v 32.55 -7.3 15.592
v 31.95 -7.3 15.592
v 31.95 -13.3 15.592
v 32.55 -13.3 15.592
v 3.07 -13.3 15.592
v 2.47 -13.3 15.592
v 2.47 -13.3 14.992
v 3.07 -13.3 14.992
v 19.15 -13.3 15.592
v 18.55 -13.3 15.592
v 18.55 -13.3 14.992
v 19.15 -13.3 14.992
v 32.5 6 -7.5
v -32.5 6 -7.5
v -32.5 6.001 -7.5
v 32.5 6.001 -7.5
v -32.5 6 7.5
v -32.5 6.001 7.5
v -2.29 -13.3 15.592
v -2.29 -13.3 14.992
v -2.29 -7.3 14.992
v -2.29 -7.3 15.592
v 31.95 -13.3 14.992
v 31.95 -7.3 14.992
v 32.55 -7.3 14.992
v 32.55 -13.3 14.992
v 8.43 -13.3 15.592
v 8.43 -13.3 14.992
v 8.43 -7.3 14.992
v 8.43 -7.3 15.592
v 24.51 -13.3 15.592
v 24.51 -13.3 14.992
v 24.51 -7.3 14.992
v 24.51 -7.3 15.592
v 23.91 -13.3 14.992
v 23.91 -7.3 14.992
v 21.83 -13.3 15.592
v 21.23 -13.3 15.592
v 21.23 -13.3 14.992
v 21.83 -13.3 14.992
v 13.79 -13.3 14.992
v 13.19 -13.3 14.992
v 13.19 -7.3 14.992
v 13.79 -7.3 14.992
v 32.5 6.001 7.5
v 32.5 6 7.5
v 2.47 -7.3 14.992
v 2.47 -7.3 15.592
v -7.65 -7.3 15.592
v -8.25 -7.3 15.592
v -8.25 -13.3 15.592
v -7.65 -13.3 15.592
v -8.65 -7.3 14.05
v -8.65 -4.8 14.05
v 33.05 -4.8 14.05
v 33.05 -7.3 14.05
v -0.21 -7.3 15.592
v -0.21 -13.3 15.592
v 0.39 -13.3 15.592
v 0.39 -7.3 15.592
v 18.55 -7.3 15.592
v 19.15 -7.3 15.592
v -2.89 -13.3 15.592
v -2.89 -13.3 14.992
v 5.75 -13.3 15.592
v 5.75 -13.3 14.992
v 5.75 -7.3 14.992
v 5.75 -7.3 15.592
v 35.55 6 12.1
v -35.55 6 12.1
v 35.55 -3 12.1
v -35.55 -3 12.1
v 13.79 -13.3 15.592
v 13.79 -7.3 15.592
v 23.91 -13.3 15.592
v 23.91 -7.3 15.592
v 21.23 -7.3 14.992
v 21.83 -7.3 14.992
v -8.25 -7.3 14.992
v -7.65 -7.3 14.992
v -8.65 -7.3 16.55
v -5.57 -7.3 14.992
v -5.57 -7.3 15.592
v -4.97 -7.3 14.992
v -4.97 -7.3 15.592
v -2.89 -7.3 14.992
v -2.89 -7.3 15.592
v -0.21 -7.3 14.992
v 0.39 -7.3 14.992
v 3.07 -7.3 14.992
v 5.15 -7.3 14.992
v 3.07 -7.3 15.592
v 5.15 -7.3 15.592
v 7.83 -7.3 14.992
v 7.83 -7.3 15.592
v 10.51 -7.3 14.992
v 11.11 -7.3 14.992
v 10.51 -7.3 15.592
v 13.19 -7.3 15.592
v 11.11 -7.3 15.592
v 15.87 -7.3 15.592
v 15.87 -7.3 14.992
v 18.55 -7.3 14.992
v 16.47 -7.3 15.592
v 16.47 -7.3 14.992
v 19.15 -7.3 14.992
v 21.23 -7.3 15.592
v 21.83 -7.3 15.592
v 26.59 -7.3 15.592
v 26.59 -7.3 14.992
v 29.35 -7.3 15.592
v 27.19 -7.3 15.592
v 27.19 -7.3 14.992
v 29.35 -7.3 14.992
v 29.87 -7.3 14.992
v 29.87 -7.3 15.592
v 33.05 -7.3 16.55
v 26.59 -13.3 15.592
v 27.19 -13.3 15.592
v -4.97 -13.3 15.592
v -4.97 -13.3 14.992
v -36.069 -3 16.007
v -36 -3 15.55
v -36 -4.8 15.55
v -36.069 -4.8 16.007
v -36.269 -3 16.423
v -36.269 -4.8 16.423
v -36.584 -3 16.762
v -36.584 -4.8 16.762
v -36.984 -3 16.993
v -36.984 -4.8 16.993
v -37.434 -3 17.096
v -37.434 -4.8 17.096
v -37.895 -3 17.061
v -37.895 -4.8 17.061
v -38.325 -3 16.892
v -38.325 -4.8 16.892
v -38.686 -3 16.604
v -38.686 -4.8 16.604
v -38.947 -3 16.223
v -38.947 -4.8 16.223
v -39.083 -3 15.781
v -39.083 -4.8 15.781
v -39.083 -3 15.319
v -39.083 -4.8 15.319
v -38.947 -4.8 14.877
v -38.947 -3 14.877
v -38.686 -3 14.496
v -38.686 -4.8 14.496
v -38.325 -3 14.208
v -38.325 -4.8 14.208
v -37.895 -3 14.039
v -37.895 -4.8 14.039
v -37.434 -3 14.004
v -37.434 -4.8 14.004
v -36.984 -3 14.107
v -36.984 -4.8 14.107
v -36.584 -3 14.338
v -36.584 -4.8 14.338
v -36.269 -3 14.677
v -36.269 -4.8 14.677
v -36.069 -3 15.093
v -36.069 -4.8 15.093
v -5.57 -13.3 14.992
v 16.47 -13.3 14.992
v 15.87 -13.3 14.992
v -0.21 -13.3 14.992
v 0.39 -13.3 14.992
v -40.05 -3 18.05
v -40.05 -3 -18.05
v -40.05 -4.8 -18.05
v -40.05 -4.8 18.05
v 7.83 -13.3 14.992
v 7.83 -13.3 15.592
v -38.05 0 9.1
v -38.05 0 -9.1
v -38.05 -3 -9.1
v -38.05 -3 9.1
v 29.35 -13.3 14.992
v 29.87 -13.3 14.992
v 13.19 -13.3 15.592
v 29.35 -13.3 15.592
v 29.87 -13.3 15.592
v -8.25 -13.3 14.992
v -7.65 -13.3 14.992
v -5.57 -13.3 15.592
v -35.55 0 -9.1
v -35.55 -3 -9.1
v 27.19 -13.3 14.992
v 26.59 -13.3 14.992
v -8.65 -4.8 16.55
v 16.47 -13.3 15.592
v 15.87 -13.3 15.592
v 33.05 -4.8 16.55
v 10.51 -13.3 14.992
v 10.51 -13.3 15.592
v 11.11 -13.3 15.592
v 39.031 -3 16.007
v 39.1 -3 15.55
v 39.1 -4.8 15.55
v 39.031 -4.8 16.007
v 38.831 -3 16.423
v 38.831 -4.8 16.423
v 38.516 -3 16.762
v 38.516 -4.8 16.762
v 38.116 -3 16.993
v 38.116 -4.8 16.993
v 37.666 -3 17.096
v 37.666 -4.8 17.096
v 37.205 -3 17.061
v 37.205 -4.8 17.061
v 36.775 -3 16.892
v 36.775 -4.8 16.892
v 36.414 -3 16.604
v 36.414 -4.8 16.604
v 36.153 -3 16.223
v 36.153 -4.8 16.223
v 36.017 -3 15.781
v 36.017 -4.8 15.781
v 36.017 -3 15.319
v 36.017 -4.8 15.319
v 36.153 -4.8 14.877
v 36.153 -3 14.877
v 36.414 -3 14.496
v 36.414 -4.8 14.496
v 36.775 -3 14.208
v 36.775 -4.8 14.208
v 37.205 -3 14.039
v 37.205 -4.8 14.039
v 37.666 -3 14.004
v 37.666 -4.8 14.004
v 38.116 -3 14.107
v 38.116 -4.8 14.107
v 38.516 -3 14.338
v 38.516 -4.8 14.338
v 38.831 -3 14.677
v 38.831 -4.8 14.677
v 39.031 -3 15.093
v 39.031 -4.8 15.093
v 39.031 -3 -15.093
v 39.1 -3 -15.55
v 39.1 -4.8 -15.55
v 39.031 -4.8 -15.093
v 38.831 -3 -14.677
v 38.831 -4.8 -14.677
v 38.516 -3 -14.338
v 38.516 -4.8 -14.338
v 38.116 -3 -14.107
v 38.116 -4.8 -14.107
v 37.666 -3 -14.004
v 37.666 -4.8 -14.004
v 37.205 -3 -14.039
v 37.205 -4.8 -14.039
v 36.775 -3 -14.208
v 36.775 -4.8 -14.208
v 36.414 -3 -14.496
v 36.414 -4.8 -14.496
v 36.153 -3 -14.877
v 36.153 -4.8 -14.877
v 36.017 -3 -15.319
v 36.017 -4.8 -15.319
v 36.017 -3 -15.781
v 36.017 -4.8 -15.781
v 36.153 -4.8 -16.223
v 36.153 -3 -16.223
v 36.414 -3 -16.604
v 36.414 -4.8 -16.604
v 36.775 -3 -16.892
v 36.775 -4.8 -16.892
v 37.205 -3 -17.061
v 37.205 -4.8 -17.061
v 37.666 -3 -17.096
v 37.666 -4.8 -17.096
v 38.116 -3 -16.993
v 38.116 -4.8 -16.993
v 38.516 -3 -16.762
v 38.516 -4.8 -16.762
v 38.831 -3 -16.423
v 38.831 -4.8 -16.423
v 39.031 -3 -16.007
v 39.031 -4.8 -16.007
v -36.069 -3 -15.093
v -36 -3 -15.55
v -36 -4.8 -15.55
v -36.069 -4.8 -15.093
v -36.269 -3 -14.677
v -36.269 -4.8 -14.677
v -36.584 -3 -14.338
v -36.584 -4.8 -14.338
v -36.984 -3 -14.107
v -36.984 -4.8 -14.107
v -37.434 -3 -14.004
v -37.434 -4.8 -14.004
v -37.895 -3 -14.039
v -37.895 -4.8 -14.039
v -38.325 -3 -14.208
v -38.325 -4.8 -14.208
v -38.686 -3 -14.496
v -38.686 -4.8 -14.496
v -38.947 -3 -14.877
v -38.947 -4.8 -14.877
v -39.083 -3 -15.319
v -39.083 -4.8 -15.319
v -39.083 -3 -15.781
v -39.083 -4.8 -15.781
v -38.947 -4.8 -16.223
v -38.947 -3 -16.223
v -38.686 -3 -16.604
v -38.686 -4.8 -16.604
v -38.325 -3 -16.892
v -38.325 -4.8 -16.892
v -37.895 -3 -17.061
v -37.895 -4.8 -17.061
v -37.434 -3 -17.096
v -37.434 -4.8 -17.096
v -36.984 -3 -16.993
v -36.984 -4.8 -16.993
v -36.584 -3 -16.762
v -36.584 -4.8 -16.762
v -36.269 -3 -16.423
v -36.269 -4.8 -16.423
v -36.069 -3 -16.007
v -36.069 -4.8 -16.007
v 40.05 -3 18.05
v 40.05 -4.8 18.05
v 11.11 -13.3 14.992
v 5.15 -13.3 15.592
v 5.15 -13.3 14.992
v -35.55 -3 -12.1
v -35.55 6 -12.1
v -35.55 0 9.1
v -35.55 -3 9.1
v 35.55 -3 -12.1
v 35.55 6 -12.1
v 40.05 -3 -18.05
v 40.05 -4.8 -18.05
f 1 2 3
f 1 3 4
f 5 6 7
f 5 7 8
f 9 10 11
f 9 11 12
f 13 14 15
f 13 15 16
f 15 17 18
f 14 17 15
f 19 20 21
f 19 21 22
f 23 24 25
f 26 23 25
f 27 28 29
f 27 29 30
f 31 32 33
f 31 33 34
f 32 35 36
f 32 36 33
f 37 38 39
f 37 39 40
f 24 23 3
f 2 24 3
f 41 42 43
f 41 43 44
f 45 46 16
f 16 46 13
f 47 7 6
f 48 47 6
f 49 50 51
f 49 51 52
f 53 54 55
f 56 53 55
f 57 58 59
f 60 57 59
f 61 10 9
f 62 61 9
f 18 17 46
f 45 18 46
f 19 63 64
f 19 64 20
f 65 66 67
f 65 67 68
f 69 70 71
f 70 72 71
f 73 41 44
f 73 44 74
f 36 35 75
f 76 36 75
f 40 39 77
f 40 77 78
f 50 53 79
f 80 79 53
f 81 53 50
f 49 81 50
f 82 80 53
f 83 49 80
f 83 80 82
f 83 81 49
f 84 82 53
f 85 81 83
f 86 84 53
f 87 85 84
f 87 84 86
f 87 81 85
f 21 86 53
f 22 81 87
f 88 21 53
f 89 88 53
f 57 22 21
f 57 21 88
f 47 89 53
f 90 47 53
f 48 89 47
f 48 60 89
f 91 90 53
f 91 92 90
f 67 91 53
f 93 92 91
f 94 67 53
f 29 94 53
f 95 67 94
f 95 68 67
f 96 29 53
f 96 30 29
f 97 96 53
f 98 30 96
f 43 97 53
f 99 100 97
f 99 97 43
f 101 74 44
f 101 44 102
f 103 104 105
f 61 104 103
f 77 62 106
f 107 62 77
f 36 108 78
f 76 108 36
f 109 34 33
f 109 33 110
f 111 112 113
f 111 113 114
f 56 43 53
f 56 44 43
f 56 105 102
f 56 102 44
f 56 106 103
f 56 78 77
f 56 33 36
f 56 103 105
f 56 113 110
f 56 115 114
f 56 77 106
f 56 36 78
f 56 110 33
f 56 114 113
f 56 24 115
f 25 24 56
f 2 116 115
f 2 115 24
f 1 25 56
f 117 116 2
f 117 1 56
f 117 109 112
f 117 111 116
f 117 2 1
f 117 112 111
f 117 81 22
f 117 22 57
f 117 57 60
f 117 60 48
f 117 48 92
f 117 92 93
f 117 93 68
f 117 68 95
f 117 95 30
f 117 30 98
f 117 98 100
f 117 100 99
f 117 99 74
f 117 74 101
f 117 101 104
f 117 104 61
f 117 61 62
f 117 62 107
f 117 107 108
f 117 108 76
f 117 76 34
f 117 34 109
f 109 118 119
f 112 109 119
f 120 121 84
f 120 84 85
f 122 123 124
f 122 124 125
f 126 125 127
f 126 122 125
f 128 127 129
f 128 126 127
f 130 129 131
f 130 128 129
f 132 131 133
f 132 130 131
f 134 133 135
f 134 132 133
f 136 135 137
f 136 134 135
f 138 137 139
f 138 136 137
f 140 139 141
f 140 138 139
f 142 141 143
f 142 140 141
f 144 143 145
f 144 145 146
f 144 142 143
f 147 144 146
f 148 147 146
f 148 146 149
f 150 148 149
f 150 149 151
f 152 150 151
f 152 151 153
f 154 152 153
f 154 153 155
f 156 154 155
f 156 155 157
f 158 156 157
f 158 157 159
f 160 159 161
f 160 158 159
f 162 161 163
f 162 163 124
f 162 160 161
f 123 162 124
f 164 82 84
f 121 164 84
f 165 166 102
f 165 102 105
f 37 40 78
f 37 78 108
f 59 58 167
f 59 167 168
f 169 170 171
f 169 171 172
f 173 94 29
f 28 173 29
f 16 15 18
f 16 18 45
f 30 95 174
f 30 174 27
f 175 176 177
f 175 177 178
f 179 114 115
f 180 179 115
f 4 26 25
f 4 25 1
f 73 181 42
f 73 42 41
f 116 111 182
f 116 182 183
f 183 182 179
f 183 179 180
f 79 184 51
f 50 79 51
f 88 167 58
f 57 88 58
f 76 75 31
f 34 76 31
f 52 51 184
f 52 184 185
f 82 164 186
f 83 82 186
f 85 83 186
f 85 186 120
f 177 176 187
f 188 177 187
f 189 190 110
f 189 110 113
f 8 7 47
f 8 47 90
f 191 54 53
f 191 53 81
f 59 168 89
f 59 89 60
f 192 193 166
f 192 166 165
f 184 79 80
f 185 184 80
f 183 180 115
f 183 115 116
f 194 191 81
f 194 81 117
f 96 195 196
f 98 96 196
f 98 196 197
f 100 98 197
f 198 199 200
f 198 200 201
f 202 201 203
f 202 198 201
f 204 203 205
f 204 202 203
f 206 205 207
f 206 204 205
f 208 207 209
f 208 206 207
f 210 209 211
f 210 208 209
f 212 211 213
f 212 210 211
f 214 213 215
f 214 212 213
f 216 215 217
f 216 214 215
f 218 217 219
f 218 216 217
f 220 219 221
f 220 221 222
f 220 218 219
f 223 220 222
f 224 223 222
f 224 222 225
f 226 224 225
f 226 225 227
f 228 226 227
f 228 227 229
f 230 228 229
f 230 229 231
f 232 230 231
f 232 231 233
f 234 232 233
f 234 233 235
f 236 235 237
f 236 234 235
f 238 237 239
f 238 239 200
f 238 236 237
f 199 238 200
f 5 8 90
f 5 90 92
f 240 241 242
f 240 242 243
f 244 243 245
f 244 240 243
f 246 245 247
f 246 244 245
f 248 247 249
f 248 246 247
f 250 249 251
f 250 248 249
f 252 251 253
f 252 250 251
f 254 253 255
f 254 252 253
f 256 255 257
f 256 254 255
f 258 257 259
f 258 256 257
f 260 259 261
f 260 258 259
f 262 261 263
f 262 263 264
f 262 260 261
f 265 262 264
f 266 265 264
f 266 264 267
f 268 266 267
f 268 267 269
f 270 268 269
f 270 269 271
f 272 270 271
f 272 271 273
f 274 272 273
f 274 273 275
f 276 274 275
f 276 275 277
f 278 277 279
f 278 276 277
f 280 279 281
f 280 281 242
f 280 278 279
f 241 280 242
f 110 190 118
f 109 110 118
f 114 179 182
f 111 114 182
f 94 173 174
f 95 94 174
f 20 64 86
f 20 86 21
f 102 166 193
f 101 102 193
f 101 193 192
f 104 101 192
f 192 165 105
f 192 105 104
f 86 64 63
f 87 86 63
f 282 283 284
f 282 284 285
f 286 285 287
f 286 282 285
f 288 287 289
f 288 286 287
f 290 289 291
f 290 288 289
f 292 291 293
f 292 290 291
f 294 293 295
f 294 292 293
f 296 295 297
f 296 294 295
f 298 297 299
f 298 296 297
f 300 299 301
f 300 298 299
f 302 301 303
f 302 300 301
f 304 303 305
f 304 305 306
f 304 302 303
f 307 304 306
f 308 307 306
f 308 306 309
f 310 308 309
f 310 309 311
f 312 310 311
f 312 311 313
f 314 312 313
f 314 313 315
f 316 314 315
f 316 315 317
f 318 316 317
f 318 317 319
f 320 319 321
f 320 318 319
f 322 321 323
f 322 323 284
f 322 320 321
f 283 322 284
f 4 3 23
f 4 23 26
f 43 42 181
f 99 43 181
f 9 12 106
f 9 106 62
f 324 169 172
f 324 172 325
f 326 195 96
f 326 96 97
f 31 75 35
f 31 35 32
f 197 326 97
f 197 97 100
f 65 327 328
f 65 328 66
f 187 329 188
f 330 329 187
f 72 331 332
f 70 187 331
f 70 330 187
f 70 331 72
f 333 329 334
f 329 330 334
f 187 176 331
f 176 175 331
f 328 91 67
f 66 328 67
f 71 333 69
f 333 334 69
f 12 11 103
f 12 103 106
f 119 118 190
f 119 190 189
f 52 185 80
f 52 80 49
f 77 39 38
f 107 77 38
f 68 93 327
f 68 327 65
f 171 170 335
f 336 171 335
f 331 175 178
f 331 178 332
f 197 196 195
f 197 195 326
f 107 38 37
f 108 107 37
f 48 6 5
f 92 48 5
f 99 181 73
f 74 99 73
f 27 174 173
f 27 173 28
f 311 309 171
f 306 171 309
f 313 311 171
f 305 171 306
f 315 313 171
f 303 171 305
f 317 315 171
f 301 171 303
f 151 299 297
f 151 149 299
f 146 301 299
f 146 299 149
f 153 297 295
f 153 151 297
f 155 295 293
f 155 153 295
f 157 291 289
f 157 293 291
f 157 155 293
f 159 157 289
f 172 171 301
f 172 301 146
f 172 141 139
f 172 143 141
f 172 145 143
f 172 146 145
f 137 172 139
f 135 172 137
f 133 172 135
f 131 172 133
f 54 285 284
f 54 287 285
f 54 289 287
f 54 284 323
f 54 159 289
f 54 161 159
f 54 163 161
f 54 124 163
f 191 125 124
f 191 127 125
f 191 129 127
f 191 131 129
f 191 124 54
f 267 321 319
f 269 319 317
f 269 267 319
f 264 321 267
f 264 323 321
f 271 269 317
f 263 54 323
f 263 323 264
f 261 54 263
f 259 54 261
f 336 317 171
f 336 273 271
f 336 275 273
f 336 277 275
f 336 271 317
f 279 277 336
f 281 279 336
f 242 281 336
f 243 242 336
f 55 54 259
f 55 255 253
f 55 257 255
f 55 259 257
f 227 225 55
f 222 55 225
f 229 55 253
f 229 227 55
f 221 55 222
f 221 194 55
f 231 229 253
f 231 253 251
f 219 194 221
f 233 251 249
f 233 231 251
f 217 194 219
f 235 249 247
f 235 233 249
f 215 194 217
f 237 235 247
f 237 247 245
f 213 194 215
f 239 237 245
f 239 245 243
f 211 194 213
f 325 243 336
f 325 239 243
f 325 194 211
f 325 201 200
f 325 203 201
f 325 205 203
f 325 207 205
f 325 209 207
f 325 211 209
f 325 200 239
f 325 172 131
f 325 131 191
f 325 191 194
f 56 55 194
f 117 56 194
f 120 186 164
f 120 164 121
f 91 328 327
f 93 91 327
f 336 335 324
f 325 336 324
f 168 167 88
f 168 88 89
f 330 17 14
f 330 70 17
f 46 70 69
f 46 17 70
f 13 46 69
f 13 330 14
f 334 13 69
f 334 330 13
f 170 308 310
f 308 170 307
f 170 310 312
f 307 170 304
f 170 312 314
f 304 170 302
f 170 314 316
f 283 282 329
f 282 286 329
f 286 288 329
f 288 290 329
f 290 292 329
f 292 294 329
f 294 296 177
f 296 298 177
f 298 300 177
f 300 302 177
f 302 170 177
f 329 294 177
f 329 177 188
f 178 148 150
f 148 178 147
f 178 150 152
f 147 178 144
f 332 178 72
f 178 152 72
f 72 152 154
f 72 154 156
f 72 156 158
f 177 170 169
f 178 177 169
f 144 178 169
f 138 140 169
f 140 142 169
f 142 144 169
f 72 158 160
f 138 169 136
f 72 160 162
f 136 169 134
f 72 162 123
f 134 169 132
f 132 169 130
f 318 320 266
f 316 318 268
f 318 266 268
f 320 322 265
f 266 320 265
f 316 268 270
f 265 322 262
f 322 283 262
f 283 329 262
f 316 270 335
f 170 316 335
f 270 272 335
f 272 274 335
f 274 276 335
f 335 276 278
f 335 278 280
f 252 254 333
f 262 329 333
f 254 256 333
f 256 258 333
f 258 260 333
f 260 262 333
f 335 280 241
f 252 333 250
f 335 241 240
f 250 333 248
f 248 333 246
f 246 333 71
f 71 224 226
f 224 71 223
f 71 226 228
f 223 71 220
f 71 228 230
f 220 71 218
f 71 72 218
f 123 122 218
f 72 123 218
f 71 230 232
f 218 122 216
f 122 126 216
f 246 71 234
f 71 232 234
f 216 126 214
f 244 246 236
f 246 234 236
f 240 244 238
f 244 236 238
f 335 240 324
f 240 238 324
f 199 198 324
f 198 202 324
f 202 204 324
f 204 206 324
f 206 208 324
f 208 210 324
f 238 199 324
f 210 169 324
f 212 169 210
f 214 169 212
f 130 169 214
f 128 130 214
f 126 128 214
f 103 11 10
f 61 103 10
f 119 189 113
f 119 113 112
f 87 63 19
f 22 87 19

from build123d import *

# Parameters (mm, degrees)
SKETCH1_W                = 71.1
SKETCH1_H                = 24.2
BOSS_EXTRUDE1_DEPTH      = 6
SKETCH2_W                = 71.1
SKETCH2_H                = 24.2
SKETCH2_W_2              = 2.5
SKETCH2_H_2              = 18.2
BOSS_EXTRUDE2_DEPTH      = 3
SKETCH3_W                = 80.1
SKETCH3_H                = 36.1
SKETCH3_R                = 1.55
BOSS_EXTRUDE3_DEPTH      = 1.8
SKETCH4_W                = 65
SKETCH4_H                = 15
BOSS_EXTRUDE4_DEPTH      = 0.001
BOSS_EXTRUDE4_DEPTH_BACK = 6
SKETCH5_W                = 41.7
SKETCH5_H                = 2.5
BOSS_EXTRUDE5_DEPTH      = 2.5
SKETCH6_W                = 0.6
SKETCH6_H                = 0.6
SKETCH6_W_2              = 0.52
BOSS_EXTRUDE6_DEPTH      = 6


with BuildPart() as part:
    # Sketch1 → Boss-Extrude1 (new body)
    with BuildSketch(Plane(origin=(0, 0, 0), x_dir=(1, 0, 0), z_dir=(0, 1, 0))):
        Rectangle(SKETCH1_W, SKETCH1_H)
    extrude(amount=BOSS_EXTRUDE1_DEPTH)

    # Sketch2 → Boss-Extrude2 (add)
    with BuildSketch(Plane.XZ):
        Rectangle(SKETCH2_W, SKETCH2_H)
        with Locations((-36.8, 0)):
            Rectangle(SKETCH2_W_2, SKETCH2_H_2)
    extrude(amount=BOSS_EXTRUDE2_DEPTH)

    # Sketch3 → Boss-Extrude3 (add)
    with BuildSketch(Plane.XZ.offset(3)):
        Rectangle(SKETCH3_W, SKETCH3_H)
        with Locations((-37.55, -15.55)):
            Circle(SKETCH3_R, mode=Mode.SUBTRACT)
        with Locations((37.55, -15.55)):
            Circle(SKETCH3_R, mode=Mode.SUBTRACT)
        with Locations((37.55, 15.55)):
            Circle(SKETCH3_R, mode=Mode.SUBTRACT)
        with Locations((-37.55, 15.55)):
            Circle(SKETCH3_R, mode=Mode.SUBTRACT)
    extrude(amount=BOSS_EXTRUDE3_DEPTH)

    # Sketch4 → Boss-Extrude4 (add, two sides)
    with BuildSketch(Plane(origin=(0, 6, 0), x_dir=(1, 0, 0), z_dir=(0, 1, 0))) as boss_extrude4_sk:
        Rectangle(SKETCH4_W, SKETCH4_H)
    extrude(amount=BOSS_EXTRUDE4_DEPTH)
    extrude(boss_extrude4_sk.sketch, amount=-BOSS_EXTRUDE4_DEPTH_BACK)

    # Sketch5 → Boss-Extrude5 (add)
    with BuildSketch(Plane.XZ.offset(4.8)):
        with Locations((12.2, 15.3)):
            Rectangle(SKETCH5_W, SKETCH5_H)
    extrude(amount=BOSS_EXTRUDE5_DEPTH)

    # Sketch6 → Boss-Extrude6 (add)
    with BuildSketch(Plane.XZ.offset(7.3)):
        with Locations((32.25, 15.292216916)):
            Rectangle(SKETCH6_W, SKETCH6_H)
        with Locations((29.61, 15.292216916)):
            Rectangle(SKETCH6_W_2, SKETCH6_H)
        with Locations((26.89, 15.292216916)):
            Rectangle(SKETCH6_W, SKETCH6_H)
        with Locations((24.21, 15.292216916)):
            Rectangle(SKETCH6_W, SKETCH6_H)
        with Locations((21.53, 15.292216916)):
            Rectangle(SKETCH6_W, SKETCH6_H)
        with Locations((18.85, 15.292216916)):
            Rectangle(SKETCH6_W, SKETCH6_H)
        with Locations((16.17, 15.292216916)):
            Rectangle(SKETCH6_W, SKETCH6_H)
        with Locations((13.49, 15.292216916)):
            Rectangle(SKETCH6_W, SKETCH6_H)
        with Locations((10.81, 15.292216916)):
            Rectangle(SKETCH6_W, SKETCH6_H)
        with Locations((8.13, 15.292216916)):
            Rectangle(SKETCH6_W, SKETCH6_H)
        with Locations((5.45, 15.292216916)):
            Rectangle(SKETCH6_W, SKETCH6_H)
        with Locations((2.77, 15.292216916)):
            Rectangle(SKETCH6_W, SKETCH6_H)
        with Locations((-7.95, 15.292216916)):
            Rectangle(SKETCH6_W, SKETCH6_H)
        with Locations((-5.27, 15.292216916)):
            Rectangle(SKETCH6_W, SKETCH6_H)
        with Locations((0.09, 15.292216916)):
            Rectangle(SKETCH6_W, SKETCH6_H)
        with Locations((-2.59, 15.292216916)):
            Rectangle(SKETCH6_W, SKETCH6_H)
    extrude(amount=BOSS_EXTRUDE6_DEPTH)


solid = part.part
